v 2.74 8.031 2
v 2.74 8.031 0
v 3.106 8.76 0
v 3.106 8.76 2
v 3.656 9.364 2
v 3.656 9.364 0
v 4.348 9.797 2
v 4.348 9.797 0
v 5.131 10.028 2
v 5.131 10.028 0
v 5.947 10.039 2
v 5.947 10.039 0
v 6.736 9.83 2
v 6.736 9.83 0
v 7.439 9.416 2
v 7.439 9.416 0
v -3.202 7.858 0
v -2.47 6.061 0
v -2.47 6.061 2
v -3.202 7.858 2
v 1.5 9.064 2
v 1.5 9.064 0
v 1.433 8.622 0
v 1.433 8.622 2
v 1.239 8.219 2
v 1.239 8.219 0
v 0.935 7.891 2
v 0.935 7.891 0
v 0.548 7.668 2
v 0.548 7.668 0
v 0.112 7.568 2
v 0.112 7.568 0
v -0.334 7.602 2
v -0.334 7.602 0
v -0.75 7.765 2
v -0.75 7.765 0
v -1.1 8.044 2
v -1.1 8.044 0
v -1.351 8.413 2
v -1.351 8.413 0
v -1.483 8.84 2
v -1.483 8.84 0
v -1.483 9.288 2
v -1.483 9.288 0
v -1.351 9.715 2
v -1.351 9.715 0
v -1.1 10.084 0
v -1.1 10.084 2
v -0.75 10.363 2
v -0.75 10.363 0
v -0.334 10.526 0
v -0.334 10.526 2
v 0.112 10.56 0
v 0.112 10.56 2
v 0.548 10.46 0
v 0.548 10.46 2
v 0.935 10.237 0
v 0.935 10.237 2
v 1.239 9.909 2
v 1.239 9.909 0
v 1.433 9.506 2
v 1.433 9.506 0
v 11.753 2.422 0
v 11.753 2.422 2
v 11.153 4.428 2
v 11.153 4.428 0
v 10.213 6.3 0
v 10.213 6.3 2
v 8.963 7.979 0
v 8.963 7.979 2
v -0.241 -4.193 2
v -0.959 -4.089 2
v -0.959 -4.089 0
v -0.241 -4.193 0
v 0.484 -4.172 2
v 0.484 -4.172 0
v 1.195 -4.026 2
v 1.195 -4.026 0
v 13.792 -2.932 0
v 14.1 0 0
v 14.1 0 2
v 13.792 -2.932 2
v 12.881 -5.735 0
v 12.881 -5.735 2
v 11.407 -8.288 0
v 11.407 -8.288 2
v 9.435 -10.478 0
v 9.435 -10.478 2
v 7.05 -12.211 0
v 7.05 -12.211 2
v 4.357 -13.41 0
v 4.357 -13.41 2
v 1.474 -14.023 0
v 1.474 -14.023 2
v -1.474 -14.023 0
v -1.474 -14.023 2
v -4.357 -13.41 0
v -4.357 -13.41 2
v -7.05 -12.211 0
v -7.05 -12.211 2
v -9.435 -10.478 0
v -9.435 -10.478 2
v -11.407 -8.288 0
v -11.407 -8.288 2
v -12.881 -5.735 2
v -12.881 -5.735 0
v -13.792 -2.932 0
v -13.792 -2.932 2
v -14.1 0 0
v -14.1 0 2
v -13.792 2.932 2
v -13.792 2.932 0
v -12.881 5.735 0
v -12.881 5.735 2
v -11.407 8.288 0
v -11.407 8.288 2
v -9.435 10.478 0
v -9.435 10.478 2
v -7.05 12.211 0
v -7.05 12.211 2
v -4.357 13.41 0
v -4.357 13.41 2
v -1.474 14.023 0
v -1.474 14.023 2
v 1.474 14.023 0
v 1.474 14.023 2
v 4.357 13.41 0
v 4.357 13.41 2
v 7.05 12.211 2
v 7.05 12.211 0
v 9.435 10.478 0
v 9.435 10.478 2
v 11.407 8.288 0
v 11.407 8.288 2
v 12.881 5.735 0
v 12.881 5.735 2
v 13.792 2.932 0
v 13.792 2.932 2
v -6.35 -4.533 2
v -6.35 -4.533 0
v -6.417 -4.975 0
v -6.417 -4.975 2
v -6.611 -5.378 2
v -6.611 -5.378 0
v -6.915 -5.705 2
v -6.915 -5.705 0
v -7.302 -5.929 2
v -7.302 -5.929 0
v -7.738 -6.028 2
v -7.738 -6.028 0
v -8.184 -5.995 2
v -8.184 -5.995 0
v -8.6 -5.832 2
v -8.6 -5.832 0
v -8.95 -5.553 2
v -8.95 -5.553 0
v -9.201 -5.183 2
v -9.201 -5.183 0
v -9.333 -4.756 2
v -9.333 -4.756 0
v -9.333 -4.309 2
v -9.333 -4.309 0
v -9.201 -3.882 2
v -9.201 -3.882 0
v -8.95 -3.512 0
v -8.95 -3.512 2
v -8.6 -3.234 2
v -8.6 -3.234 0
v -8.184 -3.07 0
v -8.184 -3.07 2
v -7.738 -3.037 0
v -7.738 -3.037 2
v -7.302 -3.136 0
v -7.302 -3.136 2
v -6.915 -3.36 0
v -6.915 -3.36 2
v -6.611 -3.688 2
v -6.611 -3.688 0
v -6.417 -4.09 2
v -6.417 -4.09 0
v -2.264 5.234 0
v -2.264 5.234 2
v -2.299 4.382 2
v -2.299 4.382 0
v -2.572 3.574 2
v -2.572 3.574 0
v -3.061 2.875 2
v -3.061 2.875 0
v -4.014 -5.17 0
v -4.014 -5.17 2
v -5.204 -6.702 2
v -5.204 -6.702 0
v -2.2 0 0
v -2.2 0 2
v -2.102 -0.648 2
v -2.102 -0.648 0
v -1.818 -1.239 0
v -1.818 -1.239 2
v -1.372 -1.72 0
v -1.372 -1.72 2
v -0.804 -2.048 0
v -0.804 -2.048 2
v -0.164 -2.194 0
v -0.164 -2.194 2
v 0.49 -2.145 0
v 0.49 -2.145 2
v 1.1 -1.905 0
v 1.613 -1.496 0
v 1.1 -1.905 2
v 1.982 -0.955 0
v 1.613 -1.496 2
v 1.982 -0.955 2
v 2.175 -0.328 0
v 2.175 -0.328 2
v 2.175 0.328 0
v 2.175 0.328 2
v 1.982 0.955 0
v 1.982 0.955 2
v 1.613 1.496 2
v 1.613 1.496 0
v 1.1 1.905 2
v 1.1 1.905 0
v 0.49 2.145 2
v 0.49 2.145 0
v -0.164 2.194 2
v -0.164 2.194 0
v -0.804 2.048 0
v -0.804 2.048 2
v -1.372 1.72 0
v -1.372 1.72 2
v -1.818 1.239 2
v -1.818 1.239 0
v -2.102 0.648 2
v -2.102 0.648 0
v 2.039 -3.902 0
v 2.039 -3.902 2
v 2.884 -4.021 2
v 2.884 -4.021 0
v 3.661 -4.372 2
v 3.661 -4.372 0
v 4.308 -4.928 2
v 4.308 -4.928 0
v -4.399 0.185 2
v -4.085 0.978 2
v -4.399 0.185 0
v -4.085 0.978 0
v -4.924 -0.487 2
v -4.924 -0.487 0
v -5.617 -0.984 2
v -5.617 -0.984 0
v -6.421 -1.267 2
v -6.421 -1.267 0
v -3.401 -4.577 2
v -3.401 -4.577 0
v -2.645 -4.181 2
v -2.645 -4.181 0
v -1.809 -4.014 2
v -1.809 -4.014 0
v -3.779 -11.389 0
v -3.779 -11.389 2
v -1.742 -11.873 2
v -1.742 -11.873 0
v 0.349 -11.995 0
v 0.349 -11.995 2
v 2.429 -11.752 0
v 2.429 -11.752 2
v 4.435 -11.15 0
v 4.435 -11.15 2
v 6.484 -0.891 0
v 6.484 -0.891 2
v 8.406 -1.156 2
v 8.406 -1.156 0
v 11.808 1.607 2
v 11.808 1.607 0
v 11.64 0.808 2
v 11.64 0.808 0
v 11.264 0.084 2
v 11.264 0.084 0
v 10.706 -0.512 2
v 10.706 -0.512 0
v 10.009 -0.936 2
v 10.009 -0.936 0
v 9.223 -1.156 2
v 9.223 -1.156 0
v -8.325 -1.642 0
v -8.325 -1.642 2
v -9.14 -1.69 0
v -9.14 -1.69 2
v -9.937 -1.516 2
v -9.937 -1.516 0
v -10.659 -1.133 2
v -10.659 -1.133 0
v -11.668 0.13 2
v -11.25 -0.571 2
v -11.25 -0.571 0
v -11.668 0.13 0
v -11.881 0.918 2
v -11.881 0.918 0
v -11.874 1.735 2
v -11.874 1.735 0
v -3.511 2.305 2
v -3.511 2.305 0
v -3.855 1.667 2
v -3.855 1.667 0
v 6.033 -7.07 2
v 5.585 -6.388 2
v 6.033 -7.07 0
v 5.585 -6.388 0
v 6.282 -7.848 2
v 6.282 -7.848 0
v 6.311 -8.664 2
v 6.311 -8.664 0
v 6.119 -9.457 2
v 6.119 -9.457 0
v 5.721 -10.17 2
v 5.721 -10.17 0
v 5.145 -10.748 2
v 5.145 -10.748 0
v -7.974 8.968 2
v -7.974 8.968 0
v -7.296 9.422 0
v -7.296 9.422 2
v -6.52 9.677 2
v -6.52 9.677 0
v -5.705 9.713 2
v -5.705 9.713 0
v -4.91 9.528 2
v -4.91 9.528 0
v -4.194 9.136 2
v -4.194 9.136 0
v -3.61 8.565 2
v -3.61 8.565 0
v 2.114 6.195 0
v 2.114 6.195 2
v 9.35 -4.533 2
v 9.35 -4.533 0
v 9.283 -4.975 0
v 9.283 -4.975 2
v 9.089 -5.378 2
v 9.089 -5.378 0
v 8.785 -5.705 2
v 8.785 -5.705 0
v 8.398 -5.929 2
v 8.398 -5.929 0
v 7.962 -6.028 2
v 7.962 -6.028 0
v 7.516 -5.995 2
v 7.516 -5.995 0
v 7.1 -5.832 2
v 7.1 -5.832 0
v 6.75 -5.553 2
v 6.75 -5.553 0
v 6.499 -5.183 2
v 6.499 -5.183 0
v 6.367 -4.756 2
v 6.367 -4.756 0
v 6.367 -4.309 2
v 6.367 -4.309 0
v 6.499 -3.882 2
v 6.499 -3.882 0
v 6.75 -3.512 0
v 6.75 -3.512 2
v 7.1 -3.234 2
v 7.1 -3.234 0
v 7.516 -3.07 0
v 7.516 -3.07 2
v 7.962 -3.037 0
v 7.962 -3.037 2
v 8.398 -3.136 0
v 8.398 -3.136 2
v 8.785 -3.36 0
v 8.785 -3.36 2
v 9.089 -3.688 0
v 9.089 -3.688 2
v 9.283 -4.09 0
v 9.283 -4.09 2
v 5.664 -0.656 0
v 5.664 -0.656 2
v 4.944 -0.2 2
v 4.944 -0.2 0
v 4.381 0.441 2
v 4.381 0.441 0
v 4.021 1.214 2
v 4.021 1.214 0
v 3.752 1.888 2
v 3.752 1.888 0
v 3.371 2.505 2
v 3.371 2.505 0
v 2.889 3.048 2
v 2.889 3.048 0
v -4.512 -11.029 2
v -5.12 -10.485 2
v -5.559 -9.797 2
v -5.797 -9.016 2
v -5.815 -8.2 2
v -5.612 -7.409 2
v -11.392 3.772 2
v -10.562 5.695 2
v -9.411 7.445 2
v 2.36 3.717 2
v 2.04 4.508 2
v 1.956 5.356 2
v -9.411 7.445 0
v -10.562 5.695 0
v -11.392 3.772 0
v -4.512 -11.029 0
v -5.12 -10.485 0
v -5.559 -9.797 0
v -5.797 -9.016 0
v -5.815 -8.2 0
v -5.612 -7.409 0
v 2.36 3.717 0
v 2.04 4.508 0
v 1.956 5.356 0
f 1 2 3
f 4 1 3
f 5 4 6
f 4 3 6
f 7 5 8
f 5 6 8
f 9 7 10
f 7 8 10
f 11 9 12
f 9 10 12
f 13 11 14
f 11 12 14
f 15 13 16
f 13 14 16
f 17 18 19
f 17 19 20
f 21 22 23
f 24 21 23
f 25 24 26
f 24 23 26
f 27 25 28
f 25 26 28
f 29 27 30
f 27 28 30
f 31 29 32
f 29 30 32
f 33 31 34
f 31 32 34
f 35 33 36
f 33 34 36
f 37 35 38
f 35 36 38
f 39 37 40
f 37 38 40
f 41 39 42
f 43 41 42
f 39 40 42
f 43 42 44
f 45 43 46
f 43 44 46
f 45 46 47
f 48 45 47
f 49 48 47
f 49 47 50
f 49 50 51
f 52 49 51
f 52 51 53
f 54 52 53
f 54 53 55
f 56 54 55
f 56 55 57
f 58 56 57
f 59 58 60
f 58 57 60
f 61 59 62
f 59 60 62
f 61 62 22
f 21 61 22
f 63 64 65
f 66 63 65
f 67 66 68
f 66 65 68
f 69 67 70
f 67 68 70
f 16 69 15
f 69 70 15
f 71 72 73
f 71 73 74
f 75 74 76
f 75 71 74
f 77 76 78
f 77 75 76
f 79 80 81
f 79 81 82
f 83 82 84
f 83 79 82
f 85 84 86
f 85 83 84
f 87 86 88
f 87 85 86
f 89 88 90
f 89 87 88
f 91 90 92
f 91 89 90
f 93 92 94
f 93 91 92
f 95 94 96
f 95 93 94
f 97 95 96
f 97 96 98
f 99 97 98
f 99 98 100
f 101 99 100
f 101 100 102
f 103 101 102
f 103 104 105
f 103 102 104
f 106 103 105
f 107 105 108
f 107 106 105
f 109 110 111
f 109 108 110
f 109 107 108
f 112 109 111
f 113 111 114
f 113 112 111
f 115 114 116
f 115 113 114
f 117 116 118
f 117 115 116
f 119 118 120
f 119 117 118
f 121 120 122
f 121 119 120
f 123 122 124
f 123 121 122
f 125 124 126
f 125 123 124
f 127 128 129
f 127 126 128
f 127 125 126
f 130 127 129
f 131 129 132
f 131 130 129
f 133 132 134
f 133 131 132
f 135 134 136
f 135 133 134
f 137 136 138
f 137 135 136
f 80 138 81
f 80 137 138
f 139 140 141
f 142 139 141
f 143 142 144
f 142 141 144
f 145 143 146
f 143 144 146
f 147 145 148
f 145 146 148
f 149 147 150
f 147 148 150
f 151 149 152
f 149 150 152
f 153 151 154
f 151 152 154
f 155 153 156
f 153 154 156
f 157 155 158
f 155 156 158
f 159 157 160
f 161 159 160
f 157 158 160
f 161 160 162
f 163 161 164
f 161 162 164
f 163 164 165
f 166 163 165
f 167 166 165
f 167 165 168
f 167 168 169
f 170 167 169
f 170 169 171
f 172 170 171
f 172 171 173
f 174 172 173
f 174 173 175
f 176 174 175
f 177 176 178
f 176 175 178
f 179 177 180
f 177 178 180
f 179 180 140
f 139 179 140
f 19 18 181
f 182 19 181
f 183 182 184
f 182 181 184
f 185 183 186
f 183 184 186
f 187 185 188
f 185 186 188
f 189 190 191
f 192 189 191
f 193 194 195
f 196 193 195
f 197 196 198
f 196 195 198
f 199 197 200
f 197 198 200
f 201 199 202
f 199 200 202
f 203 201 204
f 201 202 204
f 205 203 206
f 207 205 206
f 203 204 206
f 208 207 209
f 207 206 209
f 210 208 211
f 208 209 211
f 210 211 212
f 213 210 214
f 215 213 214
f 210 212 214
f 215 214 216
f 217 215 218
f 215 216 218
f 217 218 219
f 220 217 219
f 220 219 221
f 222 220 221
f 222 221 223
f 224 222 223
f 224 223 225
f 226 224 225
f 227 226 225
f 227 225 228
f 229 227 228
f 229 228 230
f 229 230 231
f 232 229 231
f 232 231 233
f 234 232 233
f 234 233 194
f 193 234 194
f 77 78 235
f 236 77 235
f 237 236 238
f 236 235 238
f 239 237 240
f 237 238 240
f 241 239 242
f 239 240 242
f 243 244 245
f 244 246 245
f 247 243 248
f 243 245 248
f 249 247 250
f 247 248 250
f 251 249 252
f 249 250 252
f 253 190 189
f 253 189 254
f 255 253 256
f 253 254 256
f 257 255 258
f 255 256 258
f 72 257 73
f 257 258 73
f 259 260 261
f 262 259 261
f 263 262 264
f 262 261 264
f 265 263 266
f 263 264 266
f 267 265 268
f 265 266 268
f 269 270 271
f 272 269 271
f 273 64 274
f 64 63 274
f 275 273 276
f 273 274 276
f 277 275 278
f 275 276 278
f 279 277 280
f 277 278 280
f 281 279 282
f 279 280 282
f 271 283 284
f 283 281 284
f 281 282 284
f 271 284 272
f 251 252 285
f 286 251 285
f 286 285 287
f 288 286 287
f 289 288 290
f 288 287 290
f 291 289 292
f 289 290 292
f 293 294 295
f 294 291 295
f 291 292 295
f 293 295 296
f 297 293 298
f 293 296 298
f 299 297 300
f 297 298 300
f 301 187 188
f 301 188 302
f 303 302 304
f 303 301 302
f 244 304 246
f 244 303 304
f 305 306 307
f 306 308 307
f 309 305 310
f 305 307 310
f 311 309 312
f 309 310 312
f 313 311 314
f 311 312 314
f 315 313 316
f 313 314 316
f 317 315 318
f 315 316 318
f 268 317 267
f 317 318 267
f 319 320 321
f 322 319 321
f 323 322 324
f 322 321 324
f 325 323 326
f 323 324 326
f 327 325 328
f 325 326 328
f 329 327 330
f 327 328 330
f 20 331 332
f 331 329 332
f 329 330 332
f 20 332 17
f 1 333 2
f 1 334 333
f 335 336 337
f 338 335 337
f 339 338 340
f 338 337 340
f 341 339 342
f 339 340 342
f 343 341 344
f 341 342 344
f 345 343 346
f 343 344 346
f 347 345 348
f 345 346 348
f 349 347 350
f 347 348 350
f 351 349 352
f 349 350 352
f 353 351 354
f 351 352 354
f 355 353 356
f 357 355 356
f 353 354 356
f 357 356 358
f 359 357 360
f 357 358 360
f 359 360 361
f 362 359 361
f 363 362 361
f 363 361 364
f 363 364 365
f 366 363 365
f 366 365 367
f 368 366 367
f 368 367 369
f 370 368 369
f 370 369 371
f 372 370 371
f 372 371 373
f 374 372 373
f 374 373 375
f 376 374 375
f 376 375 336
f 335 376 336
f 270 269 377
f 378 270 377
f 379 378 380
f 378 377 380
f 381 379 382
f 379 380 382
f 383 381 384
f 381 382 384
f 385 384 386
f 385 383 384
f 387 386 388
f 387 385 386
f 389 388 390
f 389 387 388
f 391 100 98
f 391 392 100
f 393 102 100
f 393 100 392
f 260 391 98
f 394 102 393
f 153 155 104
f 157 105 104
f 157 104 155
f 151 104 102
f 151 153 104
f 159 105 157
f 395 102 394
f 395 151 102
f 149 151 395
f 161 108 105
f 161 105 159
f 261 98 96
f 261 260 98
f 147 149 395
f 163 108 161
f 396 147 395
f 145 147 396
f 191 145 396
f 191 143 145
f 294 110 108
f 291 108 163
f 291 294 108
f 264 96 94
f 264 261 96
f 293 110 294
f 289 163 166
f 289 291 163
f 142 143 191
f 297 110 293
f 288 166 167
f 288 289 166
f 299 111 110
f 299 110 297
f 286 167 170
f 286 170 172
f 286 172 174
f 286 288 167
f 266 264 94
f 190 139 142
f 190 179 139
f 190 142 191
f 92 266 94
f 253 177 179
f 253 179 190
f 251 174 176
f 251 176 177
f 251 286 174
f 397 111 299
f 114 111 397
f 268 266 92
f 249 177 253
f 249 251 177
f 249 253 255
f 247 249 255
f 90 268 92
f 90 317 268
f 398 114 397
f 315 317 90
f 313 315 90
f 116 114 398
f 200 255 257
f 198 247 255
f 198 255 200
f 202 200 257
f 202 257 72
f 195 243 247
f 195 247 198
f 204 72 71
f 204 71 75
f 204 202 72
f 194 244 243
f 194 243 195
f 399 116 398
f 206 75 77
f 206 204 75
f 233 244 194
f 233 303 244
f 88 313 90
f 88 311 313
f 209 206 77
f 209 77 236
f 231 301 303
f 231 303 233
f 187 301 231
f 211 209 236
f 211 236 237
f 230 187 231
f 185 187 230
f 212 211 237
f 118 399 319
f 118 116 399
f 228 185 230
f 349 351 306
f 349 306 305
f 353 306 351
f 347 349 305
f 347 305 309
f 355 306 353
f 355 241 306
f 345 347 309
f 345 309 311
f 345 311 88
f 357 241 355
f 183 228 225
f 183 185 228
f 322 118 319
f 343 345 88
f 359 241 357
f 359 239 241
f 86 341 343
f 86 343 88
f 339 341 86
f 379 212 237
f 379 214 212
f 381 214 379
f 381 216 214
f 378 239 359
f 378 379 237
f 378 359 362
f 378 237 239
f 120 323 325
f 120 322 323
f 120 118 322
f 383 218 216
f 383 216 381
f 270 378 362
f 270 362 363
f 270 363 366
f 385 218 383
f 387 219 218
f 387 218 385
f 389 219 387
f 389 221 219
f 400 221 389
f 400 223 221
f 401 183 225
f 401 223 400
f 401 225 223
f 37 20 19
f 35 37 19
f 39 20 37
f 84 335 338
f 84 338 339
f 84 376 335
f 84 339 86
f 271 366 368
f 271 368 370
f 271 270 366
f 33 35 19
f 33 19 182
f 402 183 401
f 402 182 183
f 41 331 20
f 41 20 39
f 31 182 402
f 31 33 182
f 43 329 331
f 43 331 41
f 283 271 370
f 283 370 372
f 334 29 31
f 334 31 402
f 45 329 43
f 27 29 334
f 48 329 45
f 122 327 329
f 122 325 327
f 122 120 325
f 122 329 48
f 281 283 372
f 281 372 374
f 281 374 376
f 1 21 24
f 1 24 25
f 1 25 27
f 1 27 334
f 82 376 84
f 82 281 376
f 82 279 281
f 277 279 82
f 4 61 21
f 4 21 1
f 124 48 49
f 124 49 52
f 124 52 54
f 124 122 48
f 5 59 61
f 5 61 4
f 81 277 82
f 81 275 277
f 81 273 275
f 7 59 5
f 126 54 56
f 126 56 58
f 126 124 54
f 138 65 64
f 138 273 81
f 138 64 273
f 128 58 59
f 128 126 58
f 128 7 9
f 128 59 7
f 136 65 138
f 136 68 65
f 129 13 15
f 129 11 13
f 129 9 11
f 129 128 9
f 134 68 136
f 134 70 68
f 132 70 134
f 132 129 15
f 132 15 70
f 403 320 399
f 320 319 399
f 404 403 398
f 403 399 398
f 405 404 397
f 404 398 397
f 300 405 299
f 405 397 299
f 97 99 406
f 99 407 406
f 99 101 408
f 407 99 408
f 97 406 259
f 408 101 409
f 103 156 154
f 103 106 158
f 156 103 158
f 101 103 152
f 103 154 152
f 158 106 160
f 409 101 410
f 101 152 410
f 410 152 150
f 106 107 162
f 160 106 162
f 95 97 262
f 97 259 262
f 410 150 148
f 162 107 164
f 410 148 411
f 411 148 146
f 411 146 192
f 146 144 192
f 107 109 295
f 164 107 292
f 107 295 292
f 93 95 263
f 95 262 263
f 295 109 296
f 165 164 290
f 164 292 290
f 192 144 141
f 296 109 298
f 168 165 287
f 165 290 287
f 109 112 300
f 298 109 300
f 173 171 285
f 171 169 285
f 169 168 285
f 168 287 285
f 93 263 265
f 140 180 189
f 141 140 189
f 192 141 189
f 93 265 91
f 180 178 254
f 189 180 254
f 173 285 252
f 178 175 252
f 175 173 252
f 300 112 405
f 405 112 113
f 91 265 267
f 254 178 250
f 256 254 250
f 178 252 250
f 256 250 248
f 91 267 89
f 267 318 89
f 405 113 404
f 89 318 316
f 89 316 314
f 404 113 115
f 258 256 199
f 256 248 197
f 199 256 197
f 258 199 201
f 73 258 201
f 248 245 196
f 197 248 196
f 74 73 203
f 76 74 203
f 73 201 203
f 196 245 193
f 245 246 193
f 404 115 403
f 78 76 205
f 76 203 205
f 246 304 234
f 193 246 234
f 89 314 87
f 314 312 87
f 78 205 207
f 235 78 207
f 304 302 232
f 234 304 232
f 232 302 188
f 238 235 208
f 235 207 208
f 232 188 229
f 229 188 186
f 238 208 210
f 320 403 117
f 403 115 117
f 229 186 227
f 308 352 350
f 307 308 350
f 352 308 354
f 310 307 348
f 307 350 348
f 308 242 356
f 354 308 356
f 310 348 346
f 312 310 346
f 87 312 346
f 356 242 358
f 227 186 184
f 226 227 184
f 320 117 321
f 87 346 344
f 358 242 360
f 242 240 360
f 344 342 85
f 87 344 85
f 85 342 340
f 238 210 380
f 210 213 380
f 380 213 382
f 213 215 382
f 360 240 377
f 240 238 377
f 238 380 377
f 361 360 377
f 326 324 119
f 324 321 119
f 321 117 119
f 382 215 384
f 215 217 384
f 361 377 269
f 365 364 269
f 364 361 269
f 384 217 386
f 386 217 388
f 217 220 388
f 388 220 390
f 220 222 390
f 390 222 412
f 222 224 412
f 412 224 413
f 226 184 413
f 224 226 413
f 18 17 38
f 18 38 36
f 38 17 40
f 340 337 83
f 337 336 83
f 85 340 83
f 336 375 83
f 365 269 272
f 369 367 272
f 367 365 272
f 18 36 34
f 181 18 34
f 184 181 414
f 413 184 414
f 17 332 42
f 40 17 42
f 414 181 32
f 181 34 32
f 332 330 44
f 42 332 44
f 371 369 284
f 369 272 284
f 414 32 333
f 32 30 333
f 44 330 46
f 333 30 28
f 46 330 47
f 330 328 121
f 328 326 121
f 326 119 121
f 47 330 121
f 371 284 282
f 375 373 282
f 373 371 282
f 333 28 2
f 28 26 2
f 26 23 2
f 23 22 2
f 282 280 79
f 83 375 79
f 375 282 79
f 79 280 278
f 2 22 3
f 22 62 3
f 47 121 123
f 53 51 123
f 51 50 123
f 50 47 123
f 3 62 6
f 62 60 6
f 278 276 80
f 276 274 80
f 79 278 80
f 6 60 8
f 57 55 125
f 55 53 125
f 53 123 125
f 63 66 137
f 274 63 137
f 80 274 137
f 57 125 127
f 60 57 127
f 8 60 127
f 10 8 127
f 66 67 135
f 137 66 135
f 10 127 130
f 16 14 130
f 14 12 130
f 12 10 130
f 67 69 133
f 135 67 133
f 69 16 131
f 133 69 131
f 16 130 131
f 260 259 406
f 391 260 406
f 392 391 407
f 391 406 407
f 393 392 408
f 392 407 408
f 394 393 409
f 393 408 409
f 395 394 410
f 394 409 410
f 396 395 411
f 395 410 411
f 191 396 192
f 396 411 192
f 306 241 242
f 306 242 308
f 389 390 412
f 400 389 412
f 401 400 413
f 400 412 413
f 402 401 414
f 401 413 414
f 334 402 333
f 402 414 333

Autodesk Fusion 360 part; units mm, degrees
sketch "草图1" plane through (0, 0, 0) normal (0, 0, 1) x (1, 0, 0)
  circle A0 centre (0, 0) radius 14.1
  line L0 (0, 9.064) -> (-7.85, -4.5326)
  line L1 (-7.85, -4.5326) -> (7.85, -4.5326)
  line L2 (7.85, -4.5326) -> (0, 9.064)
  line L3 (0, 9.064) -> (15.7, 9.064) construction
  circle A1 centre (0, 9.064) radius 1.5
  circle A2 centre (-7.85, -4.5326) radius 1.5
  circle A3 centre (7.85, -4.5326) radius 1.5
  point P0 (0, -0.0004)
  dimension "d1" = 28.2
  dimension "d2" = 15.7
  dimension "d3" = 120
  dimension "d4" = 9.064
  dimension "d5" = 3
  dimension "d6" = 3
  dimension "d7" = 3
extrude "拉伸1" add sketch "草图1" along normal blind 2 contours A0 | L0 L1 L2 A1 A2 A3
sketch "草图2" plane through (0, 0, 2) normal (0, 0, 1) x (-1, 0, 0)
  circle A0 centre (7.85, 4.5326) radius 1.5
  circle A1 centre (-7.85, 4.5326) radius 1.5
  circle A2 centre (0, -9.064) radius 1.5
  circle A3 centre (0, 0) radius 14.1
  circle A4 centre (0, 0) radius 2.2
  circle A5 centre (0, 0) radius 12
  circle A6 centre (0, 0) radius 4.2
  line L0 (0, 0) -> (4.5287, -11.1127)
  line L1 (0, 0) -> (11.7731, 2.3225)
  line L2 (0, 0) -> (7.3595, 9.4783)
  line L3 (0, 0) -> (-7.8979, 9.0345)
  line L4 (0, 0) -> (-11.8882, 1.6344)
  line L5 (0, 0) -> (-3.8752, -11.3571)
  dimension "d10" = 4.4
  dimension "d13" = 24
  dimension "d14" = 8.4
  dimension "d16" = 360
extrude "拉伸2" cut sketch "草图2" against normal blind 8 contours A4 L0 L1 | A4 L1 L2 | A4 L0 L5 | A4 L2 L3 | A4 L3 L4 | A4 L4 L5 | A5 A6 L0 L1 | A5 A6 L2 L3 | A5 A6 L4 L5
fillet "圆角1" radius 3 12 edges at (-1.585, 3.8894, 1) (-4.1206, -0.8129, 1) (-2.5758, -3.3174, 1) (2.7643, -3.1621, 1) (4.1609, -0.572, 1) (1.3563, 3.975, 1) (3.8752, 11.3571, 1) (11.8882, -1.6344, 1) (-4.5287, 11.1127, 1) (-11.7731, -2.3225, 1) (-7.3595, -9.4783, 1) (7.8979, -9.0345, 1)
